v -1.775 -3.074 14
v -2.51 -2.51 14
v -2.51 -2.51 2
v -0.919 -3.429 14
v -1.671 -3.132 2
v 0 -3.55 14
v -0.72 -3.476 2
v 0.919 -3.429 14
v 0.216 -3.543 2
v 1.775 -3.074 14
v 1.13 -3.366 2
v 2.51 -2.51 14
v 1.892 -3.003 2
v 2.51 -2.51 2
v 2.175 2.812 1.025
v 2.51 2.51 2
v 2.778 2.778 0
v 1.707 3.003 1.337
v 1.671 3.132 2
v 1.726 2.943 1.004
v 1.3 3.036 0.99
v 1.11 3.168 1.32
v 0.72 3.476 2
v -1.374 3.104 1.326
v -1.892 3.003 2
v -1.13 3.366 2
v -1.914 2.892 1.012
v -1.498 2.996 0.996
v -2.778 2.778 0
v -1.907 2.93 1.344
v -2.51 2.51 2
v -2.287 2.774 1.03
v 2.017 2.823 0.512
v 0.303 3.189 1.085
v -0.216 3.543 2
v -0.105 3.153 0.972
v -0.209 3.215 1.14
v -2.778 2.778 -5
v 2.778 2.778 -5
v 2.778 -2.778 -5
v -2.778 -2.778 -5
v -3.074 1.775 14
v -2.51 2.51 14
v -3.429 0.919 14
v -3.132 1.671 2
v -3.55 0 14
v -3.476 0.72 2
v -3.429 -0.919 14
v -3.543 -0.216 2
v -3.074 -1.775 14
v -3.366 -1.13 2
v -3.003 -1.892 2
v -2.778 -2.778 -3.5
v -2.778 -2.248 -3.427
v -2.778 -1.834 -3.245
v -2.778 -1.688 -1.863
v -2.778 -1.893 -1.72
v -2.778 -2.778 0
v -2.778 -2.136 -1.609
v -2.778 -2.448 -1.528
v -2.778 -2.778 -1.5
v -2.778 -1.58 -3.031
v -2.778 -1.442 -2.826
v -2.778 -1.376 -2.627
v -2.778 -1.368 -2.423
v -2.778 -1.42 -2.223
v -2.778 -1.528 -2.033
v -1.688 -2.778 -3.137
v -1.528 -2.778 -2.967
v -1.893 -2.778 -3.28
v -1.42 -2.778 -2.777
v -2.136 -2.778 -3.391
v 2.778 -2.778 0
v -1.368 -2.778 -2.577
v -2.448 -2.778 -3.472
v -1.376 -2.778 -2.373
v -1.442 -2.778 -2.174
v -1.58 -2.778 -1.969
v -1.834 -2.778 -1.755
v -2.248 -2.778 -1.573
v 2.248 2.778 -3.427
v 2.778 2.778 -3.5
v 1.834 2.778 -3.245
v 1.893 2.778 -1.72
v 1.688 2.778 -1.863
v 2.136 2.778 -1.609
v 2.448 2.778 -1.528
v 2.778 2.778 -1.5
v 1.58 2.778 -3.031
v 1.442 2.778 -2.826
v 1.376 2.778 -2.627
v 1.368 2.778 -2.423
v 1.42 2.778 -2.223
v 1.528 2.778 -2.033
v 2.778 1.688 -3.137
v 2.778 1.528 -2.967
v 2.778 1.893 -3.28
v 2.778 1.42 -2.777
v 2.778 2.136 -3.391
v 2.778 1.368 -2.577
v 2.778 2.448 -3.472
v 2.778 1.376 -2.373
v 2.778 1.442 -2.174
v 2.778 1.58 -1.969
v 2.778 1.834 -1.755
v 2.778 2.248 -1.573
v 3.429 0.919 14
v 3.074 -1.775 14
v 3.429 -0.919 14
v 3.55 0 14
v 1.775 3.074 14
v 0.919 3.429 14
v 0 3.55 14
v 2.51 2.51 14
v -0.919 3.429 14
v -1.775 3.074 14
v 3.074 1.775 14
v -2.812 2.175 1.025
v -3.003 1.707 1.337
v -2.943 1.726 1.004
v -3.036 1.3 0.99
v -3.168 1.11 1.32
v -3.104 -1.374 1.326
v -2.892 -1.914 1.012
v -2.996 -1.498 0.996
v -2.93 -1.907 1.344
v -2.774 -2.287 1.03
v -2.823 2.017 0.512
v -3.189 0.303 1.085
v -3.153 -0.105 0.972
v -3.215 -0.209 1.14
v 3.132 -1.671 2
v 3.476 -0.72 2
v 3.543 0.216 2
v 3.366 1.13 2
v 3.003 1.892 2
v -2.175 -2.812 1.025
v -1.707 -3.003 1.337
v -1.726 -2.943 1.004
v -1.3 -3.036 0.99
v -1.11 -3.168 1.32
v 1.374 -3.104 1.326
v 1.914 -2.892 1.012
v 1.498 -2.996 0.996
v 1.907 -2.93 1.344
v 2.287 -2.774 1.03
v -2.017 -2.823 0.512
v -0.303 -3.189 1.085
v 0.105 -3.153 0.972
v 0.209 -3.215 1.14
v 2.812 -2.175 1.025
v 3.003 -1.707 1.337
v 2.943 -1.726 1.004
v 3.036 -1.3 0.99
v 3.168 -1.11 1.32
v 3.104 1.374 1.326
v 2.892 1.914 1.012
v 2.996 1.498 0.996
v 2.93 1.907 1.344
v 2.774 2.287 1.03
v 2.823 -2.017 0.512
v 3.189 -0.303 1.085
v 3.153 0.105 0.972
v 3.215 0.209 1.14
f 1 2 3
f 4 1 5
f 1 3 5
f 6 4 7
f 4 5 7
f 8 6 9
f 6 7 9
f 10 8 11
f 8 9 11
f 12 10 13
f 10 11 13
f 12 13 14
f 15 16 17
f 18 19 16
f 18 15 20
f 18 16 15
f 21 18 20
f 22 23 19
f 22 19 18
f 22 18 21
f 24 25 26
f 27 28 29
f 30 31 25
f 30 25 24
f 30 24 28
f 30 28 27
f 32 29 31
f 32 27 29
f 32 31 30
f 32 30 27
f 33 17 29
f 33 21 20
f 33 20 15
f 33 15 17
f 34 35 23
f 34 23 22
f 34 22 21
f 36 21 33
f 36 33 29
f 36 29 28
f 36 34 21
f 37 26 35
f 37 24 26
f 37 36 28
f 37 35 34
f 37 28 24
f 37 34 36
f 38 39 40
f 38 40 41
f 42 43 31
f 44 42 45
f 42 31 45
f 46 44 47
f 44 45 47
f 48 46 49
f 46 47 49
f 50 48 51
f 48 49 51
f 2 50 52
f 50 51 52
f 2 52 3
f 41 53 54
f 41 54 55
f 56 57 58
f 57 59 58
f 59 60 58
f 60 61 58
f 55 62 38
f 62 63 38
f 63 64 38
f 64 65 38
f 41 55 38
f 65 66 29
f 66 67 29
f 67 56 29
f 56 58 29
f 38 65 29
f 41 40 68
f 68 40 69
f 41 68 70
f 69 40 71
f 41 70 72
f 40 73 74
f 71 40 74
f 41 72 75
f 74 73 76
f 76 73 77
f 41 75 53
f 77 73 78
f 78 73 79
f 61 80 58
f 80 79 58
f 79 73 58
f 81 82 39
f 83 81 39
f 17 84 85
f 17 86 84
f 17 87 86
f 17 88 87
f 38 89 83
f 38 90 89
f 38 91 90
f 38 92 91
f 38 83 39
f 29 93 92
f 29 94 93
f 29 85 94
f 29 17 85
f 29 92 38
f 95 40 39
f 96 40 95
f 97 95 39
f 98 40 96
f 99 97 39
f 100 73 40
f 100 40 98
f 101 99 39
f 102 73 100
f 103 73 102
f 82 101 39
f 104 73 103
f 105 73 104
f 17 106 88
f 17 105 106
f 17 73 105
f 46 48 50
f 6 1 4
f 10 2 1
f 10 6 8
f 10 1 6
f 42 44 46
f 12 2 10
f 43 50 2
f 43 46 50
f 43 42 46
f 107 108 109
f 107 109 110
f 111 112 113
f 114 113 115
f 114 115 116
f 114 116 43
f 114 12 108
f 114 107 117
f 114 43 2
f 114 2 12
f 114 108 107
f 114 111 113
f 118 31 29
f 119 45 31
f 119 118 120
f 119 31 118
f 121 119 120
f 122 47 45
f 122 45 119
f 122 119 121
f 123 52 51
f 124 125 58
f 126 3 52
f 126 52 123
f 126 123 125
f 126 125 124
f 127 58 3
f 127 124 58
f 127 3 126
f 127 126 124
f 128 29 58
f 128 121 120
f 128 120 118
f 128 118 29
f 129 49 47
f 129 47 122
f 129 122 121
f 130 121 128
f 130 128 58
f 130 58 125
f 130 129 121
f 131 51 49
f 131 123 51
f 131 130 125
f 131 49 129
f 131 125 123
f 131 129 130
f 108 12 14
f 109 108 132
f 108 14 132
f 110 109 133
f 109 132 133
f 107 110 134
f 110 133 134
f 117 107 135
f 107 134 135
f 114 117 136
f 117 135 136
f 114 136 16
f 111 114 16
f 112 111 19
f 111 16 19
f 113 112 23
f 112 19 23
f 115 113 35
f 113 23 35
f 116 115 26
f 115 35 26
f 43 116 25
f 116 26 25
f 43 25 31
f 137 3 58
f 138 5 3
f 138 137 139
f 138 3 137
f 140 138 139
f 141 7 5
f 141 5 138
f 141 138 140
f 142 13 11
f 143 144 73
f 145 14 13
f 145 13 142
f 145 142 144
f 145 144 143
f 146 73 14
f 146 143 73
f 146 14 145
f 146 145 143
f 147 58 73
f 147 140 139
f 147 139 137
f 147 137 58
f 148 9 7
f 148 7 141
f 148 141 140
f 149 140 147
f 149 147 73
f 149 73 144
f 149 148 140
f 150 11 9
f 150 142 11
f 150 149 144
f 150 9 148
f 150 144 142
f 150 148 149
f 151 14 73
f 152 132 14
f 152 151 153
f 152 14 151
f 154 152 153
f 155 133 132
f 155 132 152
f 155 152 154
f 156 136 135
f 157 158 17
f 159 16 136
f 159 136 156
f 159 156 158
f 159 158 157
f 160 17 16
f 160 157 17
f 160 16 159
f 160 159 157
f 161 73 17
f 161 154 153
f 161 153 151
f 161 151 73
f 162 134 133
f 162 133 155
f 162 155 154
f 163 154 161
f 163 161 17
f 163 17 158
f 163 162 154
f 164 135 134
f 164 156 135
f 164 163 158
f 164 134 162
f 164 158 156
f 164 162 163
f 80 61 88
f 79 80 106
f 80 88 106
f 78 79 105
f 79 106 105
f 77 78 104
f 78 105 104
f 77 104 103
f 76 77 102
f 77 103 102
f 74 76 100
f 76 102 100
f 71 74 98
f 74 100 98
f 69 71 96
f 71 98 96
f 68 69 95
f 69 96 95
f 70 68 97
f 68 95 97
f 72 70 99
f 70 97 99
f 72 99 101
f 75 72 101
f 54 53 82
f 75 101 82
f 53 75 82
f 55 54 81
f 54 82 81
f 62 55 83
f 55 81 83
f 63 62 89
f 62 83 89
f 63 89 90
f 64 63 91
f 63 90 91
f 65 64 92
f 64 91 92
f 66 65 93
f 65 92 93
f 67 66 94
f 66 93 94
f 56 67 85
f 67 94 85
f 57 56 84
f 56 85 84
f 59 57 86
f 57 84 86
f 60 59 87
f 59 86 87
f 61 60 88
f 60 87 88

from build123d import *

# Parameters (mm, degrees)
SKETCH3_W           = 5.55685425
SKETCH3_H           = 5.55685425
BOSS_EXTRUDE1_DEPTH = 5
BOSS_EXTRUDE2_DEPTH = 12
SKETCH5_R           = 1
CUT_EXTRUDE1_DEPTH  = 5


with BuildPart() as part:
    # Sketch1 → Loft1 section 0
    with BuildSketch(Plane.XY):
        with BuildLine():
            Line((2.778427125, 2.778427125), (-2.778427125, 2.778427125))
            Line((-2.778427125, 2.778427125), (-2.778427125, -2.778427125))
            Line((-2.778427125, -2.778427125), (2.778427125, -2.778427125))
            Line((2.778427125, -2.778427125), (2.778427125, 2.778427125))
        make_face()
    # Sketch2 for Loft1 → Loft1 section 1
    with BuildSketch(Plane.XY.offset(2)):
        with BuildLine():
            # circular arc as an exact rational Bezier (weights 1, cos(half-angle), 1)
            Bezier((2.510229073, 2.510229073), (0, 5.020458147), (-2.510229073, 2.510229073), weights=[1, 0.707106781, 1])
            Bezier((-2.510229073, 2.510229073), (-5.020458147, 0), (-2.510229073, -2.510229073), weights=[1, 0.707106781, 1])
            Bezier((-2.510229073, -2.510229073), (0, -5.020458147), (2.510229073, -2.510229073), weights=[1, 0.707106781, 1])
            Bezier((2.510229073, -2.510229073), (5.020458147, 0), (2.510229073, 2.510229073), weights=[1, 0.707106781, 1])
        make_face()
    loft()

    # Sketch3 → Boss-Extrude1 (add)
    with BuildSketch(Plane(origin=(0, 0, 0), x_dir=(-1, 0, 0), z_dir=(0, 0, -1))):
        Rectangle(SKETCH3_W, SKETCH3_H)
    extrude(amount=BOSS_EXTRUDE1_DEPTH)

    # Sketch4 → Boss-Extrude2 (add)
    with BuildSketch(Plane.XY.offset(2)):
        with BuildLine():
            ThreePointArc((2.510229073, 2.510229073), (0, 3.55), (-2.510229073, 2.510229073))
            ThreePointArc((-2.510229073, 2.510229073), (-3.55, 0), (-2.510229073, -2.510229073))
            ThreePointArc((-2.510229073, -2.510229073), (0, -3.55), (2.510229073, -2.510229073))
            ThreePointArc((2.510229073, -2.510229073), (3.55, 0), (2.510229073, 2.510229073))
        make_face()
    extrude(amount=BOSS_EXTRUDE2_DEPTH)

    # Sketch5 → Cut-Extrude1 (cut, symmetric)
    with BuildSketch(Plane(origin=(0, 0, 0), x_dir=(0, 0, -1), z_dir=(0.7071067811865488, 0.7071067811865464, 0))):
        with Locations((2.5, 0)):
            Circle(SKETCH5_R)
    extrude(amount=CUT_EXTRUDE1_DEPTH, both=True, mode=Mode.SUBTRACT)


solid = part.part
